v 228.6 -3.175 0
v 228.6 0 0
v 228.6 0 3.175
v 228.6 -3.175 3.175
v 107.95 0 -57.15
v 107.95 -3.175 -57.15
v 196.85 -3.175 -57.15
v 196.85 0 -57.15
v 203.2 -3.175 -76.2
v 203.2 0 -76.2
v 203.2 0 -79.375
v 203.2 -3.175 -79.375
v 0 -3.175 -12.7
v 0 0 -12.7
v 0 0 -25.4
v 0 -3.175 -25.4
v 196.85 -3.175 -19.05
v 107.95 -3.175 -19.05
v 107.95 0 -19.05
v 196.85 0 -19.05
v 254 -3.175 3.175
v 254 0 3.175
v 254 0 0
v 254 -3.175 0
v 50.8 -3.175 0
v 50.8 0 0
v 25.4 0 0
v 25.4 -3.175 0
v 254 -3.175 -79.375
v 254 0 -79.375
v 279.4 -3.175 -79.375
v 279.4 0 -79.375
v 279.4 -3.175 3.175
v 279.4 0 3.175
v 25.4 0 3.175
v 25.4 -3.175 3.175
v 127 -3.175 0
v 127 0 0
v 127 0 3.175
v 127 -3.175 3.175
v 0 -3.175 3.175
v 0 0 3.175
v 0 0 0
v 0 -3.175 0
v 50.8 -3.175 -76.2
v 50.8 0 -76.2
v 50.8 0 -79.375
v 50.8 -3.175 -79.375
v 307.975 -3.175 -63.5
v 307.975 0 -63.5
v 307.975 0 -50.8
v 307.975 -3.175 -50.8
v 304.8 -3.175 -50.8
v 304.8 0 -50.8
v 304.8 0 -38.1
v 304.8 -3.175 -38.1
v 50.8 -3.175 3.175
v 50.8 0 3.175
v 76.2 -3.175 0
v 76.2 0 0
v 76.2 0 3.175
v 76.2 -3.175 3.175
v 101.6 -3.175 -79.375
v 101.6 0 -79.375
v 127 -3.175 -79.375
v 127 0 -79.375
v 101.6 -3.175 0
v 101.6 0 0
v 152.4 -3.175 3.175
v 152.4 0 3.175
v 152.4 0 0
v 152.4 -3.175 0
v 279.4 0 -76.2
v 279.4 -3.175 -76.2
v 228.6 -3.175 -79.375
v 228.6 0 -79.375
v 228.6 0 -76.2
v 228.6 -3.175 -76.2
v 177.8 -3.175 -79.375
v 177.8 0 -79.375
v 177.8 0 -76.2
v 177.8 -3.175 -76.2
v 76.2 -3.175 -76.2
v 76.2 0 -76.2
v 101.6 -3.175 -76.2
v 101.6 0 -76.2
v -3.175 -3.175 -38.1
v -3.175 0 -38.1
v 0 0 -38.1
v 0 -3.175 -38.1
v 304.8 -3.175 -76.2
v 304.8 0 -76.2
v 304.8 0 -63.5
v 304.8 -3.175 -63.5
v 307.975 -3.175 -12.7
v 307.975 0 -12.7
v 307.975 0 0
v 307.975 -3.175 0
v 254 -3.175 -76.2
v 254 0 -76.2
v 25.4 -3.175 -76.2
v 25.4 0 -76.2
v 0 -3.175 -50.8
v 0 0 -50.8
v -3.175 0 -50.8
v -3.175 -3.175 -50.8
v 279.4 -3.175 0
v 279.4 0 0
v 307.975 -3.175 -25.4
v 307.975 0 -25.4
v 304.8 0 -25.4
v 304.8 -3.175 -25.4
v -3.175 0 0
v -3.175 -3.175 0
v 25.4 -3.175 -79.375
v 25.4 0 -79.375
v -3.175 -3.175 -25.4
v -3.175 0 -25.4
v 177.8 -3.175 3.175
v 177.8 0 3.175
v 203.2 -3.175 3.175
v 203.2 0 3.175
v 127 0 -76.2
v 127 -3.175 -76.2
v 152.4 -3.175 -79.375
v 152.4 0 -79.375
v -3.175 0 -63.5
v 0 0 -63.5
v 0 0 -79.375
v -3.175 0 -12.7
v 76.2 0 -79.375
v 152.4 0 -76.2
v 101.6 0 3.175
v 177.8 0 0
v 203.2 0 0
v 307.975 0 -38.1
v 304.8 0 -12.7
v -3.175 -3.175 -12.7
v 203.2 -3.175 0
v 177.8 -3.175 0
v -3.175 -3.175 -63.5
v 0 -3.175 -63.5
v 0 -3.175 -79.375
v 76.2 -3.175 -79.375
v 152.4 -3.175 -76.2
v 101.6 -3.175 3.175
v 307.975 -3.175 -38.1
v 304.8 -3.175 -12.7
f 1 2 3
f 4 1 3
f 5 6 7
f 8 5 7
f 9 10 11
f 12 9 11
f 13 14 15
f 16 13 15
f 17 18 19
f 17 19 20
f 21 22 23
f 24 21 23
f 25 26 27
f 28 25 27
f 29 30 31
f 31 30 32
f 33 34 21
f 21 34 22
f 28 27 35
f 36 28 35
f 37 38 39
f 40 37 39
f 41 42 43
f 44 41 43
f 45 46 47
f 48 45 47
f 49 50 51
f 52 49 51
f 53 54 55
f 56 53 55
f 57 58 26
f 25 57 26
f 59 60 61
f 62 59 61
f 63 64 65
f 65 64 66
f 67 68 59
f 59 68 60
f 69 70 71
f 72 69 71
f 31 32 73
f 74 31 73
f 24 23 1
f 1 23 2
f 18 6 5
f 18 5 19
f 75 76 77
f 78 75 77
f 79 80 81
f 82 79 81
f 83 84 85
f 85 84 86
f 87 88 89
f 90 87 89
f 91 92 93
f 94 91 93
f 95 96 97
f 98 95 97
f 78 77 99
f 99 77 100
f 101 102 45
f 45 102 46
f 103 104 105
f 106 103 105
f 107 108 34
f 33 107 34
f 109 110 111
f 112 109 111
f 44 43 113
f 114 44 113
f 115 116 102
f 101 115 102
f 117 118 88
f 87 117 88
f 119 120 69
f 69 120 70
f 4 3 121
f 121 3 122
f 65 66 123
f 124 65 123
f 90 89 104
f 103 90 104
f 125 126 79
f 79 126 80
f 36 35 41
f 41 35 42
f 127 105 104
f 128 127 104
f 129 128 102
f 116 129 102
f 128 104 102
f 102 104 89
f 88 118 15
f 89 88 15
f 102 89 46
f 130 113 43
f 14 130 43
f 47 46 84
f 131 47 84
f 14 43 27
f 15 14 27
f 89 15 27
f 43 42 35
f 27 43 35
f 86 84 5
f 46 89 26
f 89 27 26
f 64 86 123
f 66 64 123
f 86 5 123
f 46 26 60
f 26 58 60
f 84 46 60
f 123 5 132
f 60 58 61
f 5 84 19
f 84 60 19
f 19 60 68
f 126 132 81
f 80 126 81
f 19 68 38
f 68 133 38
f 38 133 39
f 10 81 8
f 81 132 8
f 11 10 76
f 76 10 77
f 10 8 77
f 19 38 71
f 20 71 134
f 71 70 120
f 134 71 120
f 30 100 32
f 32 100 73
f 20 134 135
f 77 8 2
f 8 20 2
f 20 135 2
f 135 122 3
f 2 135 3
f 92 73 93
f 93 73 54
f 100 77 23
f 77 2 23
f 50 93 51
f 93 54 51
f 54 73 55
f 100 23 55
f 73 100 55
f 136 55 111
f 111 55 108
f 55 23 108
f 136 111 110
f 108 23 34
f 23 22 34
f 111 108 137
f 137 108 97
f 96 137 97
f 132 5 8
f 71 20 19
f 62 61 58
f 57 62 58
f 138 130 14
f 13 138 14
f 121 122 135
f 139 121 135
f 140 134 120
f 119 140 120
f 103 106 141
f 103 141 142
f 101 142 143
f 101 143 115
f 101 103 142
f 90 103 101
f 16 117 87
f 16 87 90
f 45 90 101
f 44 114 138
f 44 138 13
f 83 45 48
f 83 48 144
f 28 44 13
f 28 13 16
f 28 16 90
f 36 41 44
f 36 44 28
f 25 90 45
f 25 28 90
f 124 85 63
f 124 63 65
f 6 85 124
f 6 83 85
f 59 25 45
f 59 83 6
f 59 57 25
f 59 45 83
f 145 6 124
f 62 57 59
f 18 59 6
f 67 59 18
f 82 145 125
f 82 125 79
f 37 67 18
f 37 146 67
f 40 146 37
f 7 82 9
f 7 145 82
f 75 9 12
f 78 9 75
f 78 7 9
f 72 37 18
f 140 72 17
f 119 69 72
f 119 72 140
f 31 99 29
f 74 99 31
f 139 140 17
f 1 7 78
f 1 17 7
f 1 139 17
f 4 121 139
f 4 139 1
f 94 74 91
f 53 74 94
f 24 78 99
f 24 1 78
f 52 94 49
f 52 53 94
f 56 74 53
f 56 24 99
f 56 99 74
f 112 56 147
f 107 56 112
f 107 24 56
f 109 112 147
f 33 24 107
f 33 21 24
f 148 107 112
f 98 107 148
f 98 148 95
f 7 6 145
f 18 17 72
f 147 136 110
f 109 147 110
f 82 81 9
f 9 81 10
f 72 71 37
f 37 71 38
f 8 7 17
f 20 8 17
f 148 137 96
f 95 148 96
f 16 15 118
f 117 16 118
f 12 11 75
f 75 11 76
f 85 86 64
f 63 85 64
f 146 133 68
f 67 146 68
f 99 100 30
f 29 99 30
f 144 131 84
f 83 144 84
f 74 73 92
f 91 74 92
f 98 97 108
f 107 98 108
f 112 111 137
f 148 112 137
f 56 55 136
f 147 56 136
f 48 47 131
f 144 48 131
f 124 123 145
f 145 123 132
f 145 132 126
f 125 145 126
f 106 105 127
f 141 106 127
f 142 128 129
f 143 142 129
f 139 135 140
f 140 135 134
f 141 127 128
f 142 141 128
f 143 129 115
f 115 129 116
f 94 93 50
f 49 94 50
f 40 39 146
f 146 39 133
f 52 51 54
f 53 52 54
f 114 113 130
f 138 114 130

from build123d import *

# Parameters (mm, degrees)
F1_DEPTH = 3.175
F2_W     = 88.9
F2_H     = 38.1
F3_DEPTH = 25.4


# Not quite as in the source:
# - a length typed as a fraction of an inch, garbled in the dataset ("3 / 203.2 mm" for 3/8 in), is restored


with BuildPart() as f1:
    # F0 (on Front) → F1 (new body)
    with BuildSketch(Plane.XZ):
        Polygon((50.8, 0), (25.4, 0), (25.4, 3.175), (0, 3.175), (0, 0), (-3.175, 0), (-3.175, -12.7), (0, -12.7), (0, -25.4), (-3.175, -25.4), (-3.175, -38.1), (0, -38.1), (0, -50.8), (-3.175, -50.8), (-3.175, -63.5), (0, -63.5), (0, -76.2), (0, -79.375), (25.4, -79.375), (25.4, -76.2), (50.8, -76.2), (50.8, -79.375), (76.2, -79.375), (76.2, -76.2), (101.6, -76.2), (101.6, -79.375), (127, -79.375), (127, -76.2), (152.4, -76.2), (152.4, -79.375), (177.8, -79.375), (177.8, -76.2), (203.2, -76.2), (203.2, -79.375), (228.6, -79.375), (228.6, -76.2), (254, -76.2), (254, -79.375), (279.4, -79.375), (279.4, -76.2), (304.8, -76.2), (304.8, -63.5), (307.975, -63.5), (307.975, -50.8), (304.8, -50.8), (304.8, -38.1), (307.975, -38.1), (307.975, -25.4), (304.8, -25.4), (304.8, -12.7), (307.975, -12.7), (307.975, 0), (304.8, 0), (279.4, 0), (279.4, 3.175), (254, 3.175), (254, 0), (228.6, 0), (228.6, 3.175), (203.2, 3.175), (203.2, 0), (177.8, 0), (177.8, 3.175), (152.4, 3.175), (152.4, 0), (127, 0), (127, 3.175), (101.6, 3.175), (101.6, 0), (76.2, 0), (76.2, 3.175), (50.8, 3.175), align=None)
    extrude(amount=F1_DEPTH)

    # F2 (on face) → F3 (cut)
    with BuildSketch(Plane.XZ.offset(3.175)):
        with Locations((152.4, -38.1)):
            Rectangle(F2_W, F2_H)
    extrude(amount=-F3_DEPTH, mode=Mode.SUBTRACT)


solid = f1.part
